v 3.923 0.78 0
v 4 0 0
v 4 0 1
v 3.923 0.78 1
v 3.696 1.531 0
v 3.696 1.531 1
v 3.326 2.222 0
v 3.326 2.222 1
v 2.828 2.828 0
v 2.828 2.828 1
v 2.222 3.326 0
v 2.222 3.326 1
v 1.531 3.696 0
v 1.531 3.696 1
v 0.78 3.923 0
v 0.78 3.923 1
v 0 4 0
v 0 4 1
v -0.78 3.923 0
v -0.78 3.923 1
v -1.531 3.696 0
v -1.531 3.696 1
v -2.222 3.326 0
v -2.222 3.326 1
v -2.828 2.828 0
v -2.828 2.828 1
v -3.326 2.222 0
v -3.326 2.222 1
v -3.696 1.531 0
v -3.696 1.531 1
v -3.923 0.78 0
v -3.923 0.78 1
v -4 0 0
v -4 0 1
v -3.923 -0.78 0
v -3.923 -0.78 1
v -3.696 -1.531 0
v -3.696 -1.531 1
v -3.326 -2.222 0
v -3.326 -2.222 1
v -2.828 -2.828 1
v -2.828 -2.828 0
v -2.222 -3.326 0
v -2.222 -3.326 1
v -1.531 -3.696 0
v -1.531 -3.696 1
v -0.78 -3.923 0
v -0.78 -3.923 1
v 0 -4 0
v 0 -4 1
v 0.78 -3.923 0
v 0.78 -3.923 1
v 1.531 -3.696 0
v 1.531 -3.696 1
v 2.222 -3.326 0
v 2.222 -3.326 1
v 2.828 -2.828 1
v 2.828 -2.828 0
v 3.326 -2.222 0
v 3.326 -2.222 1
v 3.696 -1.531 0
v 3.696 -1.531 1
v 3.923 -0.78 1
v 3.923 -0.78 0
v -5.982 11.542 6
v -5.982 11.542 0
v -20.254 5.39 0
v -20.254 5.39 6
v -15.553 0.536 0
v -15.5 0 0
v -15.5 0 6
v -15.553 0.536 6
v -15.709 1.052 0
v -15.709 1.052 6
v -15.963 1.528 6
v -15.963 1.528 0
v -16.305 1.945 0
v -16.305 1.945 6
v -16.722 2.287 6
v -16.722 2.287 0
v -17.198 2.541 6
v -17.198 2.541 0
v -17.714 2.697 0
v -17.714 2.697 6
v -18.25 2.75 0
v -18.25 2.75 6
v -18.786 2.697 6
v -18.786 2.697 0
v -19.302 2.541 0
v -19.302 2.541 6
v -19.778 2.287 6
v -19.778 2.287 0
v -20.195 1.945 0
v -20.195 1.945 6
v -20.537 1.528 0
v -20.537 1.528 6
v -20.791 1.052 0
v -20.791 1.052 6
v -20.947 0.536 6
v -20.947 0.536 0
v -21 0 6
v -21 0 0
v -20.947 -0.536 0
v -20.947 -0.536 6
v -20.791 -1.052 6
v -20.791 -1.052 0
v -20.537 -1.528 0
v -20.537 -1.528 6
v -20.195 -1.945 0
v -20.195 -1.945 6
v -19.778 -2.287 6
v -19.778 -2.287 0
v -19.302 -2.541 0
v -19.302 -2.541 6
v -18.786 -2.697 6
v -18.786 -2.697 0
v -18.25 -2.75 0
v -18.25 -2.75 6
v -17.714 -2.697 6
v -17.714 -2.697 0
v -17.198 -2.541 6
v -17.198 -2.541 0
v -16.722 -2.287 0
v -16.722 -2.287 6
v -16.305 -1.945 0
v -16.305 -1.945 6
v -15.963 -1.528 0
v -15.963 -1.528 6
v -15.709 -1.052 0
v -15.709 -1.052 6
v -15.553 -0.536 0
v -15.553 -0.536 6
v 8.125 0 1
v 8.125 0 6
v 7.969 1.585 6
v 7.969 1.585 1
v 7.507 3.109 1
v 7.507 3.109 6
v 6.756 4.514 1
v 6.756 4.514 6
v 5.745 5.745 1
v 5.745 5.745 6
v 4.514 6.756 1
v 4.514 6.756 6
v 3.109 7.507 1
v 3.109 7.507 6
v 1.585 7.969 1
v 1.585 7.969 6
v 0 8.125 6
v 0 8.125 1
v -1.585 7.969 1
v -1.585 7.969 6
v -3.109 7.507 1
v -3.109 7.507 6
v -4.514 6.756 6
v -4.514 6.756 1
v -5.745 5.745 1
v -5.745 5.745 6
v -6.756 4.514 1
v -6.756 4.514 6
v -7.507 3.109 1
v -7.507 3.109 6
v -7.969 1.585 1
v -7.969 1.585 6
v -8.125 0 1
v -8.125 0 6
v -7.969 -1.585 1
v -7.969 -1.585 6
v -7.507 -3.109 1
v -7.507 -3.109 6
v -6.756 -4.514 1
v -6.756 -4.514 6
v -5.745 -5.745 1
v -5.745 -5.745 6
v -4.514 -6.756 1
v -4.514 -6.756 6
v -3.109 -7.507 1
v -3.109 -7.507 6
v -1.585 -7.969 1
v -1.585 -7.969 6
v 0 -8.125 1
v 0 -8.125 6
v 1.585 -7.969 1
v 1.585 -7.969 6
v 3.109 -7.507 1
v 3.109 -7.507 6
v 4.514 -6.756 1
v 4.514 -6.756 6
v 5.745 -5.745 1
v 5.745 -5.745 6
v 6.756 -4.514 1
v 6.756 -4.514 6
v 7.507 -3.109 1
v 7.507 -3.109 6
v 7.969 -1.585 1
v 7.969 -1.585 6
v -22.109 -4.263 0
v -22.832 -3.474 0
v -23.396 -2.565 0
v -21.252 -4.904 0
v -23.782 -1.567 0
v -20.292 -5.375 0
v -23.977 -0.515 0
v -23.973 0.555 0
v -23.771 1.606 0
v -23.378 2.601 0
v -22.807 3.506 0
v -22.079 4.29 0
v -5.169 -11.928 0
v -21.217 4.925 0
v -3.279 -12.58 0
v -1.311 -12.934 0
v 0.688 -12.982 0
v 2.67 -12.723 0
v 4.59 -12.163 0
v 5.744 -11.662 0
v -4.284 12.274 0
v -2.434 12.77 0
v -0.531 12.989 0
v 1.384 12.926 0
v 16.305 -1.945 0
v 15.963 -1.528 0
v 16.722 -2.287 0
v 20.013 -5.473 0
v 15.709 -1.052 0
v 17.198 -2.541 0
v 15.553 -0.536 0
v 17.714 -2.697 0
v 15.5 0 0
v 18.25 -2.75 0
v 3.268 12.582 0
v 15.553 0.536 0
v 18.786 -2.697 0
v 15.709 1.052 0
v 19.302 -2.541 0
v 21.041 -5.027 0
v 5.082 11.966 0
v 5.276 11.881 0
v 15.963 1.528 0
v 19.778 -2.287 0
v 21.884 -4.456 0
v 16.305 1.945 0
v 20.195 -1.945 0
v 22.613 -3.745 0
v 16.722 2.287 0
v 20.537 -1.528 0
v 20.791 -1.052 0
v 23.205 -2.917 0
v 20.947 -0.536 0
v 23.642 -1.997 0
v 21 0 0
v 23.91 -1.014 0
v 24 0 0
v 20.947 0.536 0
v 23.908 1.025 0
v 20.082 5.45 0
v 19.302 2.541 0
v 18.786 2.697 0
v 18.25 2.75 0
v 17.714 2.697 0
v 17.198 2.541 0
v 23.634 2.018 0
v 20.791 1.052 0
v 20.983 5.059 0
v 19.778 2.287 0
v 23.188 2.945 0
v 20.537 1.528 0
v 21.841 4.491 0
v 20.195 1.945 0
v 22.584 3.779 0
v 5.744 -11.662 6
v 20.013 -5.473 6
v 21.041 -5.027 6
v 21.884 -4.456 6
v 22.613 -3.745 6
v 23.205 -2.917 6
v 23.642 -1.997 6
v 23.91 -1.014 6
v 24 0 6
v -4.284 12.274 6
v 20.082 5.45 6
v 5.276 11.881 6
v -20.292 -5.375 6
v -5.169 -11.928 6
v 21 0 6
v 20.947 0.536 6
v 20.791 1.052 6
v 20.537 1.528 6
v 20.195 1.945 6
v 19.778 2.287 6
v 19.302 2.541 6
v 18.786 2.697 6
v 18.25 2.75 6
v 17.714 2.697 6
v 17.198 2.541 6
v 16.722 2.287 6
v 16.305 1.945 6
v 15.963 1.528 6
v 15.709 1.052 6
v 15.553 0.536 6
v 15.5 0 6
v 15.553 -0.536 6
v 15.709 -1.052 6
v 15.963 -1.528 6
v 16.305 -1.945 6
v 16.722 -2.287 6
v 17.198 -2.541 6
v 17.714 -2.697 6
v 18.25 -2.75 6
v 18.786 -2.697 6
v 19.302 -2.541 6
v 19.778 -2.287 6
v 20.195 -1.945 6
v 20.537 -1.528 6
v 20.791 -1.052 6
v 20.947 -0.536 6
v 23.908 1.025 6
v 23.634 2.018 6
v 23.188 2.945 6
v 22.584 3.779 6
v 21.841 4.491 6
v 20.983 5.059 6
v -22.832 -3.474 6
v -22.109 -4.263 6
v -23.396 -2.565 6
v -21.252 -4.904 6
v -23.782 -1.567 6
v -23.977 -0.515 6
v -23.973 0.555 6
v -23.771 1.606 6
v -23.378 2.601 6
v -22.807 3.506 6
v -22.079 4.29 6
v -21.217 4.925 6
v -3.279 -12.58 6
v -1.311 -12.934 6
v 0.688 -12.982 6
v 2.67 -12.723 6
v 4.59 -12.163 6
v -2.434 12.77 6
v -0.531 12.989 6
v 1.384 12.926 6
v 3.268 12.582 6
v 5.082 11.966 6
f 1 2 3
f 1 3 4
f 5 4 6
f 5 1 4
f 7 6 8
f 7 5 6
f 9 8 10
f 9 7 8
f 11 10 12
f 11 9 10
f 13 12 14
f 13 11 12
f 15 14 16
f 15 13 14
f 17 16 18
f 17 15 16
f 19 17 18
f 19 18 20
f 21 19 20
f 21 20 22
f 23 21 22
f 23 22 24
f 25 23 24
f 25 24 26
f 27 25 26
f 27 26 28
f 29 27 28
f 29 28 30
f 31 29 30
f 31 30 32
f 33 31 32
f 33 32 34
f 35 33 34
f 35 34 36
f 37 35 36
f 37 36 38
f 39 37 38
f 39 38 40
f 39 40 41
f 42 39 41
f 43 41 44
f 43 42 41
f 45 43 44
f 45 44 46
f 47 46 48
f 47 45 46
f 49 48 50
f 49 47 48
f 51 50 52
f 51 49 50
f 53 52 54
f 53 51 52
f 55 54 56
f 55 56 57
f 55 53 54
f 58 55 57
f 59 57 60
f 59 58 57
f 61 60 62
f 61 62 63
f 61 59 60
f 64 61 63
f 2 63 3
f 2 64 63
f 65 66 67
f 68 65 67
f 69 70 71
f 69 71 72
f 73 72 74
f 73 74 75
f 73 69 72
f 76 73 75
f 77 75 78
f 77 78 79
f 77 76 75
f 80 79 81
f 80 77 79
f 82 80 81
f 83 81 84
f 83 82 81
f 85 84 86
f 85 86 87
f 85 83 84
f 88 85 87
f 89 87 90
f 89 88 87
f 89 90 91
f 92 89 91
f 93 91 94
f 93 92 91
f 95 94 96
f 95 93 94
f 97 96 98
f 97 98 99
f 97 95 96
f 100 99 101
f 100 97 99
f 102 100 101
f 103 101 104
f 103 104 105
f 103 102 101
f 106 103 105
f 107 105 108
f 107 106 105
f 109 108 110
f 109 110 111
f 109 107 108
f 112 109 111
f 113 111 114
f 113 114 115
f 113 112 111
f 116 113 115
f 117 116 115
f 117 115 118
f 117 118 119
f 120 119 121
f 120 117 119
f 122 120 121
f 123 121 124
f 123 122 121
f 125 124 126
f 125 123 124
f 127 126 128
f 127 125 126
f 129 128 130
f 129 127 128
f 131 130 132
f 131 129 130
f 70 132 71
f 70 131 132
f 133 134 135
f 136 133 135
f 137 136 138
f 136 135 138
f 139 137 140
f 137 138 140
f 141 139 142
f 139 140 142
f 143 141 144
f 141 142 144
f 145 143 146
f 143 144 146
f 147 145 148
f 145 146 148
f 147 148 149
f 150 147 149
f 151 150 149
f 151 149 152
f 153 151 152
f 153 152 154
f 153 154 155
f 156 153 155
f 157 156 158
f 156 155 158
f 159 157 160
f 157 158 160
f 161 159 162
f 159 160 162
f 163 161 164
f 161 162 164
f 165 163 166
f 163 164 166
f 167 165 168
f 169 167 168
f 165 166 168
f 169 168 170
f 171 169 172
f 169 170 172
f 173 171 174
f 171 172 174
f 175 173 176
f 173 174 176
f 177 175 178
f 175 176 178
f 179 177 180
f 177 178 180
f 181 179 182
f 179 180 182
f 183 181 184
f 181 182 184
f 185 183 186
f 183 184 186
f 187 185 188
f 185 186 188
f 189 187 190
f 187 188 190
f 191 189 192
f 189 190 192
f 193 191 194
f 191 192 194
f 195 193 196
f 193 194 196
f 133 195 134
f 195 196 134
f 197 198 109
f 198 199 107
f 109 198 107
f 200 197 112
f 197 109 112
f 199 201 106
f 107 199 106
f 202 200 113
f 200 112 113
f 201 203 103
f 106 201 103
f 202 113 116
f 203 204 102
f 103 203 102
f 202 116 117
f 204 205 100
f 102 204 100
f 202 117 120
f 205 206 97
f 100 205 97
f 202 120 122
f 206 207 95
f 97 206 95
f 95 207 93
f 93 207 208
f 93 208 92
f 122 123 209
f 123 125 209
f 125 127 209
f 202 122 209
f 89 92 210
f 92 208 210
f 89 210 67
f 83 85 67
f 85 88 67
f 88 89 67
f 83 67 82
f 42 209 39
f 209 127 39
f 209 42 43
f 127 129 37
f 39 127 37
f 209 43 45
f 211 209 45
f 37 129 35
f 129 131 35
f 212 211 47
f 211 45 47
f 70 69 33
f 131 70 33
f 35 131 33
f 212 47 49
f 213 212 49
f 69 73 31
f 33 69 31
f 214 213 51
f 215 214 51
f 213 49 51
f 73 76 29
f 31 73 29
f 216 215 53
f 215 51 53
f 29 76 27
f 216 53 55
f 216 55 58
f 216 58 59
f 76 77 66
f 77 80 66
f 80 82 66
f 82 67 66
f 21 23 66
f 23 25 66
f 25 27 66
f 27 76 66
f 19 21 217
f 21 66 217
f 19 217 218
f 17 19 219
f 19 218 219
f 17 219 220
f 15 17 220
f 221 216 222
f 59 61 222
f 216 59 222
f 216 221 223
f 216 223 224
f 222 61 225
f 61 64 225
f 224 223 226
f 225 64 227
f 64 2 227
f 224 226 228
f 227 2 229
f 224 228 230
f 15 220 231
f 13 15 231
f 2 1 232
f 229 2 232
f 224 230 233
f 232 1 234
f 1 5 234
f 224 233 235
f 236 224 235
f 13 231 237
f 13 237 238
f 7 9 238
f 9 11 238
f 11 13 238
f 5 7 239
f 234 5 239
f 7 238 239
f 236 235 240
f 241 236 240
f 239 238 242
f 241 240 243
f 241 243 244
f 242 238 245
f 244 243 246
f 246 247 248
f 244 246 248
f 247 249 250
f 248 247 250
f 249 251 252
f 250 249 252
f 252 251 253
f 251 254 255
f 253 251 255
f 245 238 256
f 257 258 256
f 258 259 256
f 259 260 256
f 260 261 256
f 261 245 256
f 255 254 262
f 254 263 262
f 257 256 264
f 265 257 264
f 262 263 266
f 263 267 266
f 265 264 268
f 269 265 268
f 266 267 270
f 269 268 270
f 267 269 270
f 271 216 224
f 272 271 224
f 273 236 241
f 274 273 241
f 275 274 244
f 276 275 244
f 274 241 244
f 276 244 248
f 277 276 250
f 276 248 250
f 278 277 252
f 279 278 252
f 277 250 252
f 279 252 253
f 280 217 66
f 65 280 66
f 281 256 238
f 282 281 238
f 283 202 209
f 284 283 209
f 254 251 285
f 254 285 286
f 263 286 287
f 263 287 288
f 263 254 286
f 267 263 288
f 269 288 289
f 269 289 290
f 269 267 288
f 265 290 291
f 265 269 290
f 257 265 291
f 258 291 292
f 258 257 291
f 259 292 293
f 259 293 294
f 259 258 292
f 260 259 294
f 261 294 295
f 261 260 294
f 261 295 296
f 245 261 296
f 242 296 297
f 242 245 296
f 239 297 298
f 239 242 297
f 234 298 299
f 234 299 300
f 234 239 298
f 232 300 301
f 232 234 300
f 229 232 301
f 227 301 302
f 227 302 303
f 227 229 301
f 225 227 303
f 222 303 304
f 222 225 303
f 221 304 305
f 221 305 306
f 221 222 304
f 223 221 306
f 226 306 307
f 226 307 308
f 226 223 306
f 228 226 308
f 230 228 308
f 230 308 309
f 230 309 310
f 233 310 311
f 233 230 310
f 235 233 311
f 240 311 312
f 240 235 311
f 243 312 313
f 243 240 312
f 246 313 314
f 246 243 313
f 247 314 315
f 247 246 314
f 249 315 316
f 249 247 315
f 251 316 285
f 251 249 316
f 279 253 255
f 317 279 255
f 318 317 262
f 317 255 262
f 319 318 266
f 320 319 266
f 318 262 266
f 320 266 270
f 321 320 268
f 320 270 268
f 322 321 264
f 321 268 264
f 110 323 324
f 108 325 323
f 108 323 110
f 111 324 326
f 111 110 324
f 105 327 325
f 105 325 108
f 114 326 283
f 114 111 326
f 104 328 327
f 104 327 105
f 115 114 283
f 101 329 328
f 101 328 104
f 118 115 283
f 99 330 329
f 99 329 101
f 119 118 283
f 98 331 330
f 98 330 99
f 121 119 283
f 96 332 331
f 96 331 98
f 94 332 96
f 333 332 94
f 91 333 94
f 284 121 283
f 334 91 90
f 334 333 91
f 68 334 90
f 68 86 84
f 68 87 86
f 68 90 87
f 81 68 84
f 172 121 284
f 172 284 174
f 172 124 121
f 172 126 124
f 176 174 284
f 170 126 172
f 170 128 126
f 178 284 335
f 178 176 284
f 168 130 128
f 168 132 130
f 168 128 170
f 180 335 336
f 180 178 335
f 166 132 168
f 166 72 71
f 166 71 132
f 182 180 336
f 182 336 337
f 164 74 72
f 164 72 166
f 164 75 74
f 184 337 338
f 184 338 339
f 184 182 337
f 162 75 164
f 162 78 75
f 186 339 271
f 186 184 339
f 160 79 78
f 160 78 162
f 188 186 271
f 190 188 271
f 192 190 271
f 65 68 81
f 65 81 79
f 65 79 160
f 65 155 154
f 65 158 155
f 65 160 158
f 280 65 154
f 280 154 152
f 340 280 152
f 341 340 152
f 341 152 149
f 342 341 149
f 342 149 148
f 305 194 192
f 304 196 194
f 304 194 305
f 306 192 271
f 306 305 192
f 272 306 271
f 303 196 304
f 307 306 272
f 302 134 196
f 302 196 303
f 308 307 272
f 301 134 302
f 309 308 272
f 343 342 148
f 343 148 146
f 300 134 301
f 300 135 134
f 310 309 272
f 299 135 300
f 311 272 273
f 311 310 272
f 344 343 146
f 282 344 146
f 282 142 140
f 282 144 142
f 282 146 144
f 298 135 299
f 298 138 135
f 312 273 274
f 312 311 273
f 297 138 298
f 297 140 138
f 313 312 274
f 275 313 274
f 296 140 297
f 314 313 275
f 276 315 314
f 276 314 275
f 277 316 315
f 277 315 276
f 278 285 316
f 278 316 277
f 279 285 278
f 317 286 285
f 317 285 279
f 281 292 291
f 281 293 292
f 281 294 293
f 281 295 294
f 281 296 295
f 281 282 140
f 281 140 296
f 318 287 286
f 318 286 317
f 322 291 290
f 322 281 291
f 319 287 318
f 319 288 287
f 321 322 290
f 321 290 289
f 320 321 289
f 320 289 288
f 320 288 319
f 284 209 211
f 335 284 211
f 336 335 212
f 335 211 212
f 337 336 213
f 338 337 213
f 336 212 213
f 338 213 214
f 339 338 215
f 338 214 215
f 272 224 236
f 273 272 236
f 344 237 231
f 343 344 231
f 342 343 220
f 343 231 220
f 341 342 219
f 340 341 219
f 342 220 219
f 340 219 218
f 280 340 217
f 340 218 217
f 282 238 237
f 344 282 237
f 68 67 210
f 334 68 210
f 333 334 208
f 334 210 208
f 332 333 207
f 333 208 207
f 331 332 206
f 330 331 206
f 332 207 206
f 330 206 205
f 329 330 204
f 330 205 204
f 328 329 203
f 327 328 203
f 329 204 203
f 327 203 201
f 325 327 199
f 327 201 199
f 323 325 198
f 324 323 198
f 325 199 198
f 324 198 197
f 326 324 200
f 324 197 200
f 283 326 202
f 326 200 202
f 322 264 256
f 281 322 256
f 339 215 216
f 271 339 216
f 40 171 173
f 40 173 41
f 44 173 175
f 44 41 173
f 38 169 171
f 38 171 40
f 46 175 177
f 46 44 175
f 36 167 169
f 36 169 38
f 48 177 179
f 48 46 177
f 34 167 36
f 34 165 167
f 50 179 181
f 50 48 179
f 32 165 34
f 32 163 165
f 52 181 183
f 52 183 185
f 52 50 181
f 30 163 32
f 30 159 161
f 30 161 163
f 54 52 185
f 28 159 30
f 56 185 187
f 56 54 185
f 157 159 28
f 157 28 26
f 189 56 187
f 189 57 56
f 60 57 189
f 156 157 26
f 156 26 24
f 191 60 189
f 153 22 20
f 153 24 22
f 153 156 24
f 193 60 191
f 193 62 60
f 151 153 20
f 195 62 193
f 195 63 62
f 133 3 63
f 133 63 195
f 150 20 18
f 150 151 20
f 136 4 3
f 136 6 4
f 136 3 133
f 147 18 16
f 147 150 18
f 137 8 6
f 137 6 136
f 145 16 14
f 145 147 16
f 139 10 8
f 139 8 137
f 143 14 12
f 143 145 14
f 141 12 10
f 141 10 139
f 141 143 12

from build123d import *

# Parameters (mm, degrees)
F0_R     = 2.75
F0_R_2   = 4
F1_DEPTH = 6
F2_R     = 8.125
F2_R_2   = 4
F3_DEPTH = 5


# Not quite as in the source:
# - a feature names something its author has since deleted; it is built from what else it names


with BuildPart() as f1:
    # F0 (on Top) → F1 (new body)
    with BuildSketch(Plane.XY):
        with BuildLine():
            ThreePointArc((20.0822139412, 5.4502744952), (15.7589539647, 5.182392271), (12.8493150685, 1.9736013454))
            ThreePointArc((12.8493150685, 1.9736013454), (12.9622740268, 0.9896727008), (13, 0))
            ThreePointArc((13, 0), (12.9622740268, -0.9896727008), (12.8493150685, -1.9736013454))
            ThreePointArc((12.8493150685, -1.9736013454), (15.7262122641, -5.1665264409), (20.0130954241, -5.4730242577))
            Line((20.0130954241, -5.4730242577), (21.0412591059, -5.0270640143))
            ThreePointArc((21.0412591059, -5.0270640143), (23.2054131946, -2.9165699153), (24, 0))
            ThreePointArc((24, 0), (23.1883419046, 2.9453826972), (20.982511571, 5.0592371474))
            Line((20.982511571, 5.0592371474), (20.0822139412, 5.4502744952))
        make_face()
        with Locations((18.25, 0)):
            Circle(F0_R, mode=Mode.SUBTRACT)
        with BuildLine():
            Line((20.0822139412, 5.4502744952), (5.2758693561, 11.8812963323))
            ThreePointArc((5.2758693561, 11.8812963323), (10.328174214, 7.8948601891), (12.8493150685, 1.9736013454))
            ThreePointArc((12.8493150685, 1.9736013454), (15.7589539647, 5.182392271), (20.0822139412, 5.4502744952))
        make_face()
        with BuildLine():
            ThreePointArc((13, 0), (12.9622740268, 0.9896727008), (12.8493150685, 1.9736013454))
            ThreePointArc((12.8493150685, 1.9736013454), (12.5, 0), (12.8493150685, -1.9736013454))
            ThreePointArc((12.8493150685, -1.9736013454), (12.9622740268, -0.9896727008), (13, 0))
        make_face()
        with BuildLine():
            ThreePointArc((20.0130954241, -5.4730242577), (15.7262122641, -5.1665264409), (12.8493150685, -1.9736013454))
            ThreePointArc((12.8493150685, -1.9736013454), (10.4831727002, -7.6878534154), (5.7442785493, -11.6620437295))
            Line((5.7442785493, -11.6620437295), (20.0130954241, -5.4730242577))
        make_face()
        with BuildLine():
            Line((5.2758693561, 11.8812963323), (5.0818351063, 11.9655736157))
            ThreePointArc((5.0818351063, 11.9655736157), (0.4274688612, 12.9929700366), (-4.2843620194, 12.273721607))
            Line((-4.2843620194, 12.273721607), (-5.9821590265, 11.5418271249))
            ThreePointArc((-5.9821590265, 11.5418271249), (-10.5614317348, 7.5799841498), (-12.8493150685, 1.9736013454))
            ThreePointArc((-12.8493150685, 1.9736013454), (-12.588002192, 1.0021381252), (-12.5, 0))
            ThreePointArc((-12.5, 0), (-12.588002192, -1.0021381252), (-12.8493150685, -1.9736013454))
            ThreePointArc((-12.8493150685, -1.9736013454), (-10.2925346971, -7.9412675001), (-5.1687008476, -11.9283079918))
            ThreePointArc((-5.1687008476, -11.9283079918), (-0.3123803464, -12.9962463242), (4.589640736, -12.1628614197))
            Line((4.589640736, -12.1628614197), (5.7442785493, -11.6620437295))
            ThreePointArc((5.7442785493, -11.6620437295), (10.4831727002, -7.6878534154), (12.8493150685, -1.9736013454))
            ThreePointArc((12.8493150685, -1.9736013454), (12.5, 0), (12.8493150685, 1.9736013454))
            ThreePointArc((12.8493150685, 1.9736013454), (10.328174214, 7.8948601891), (5.2758693561, 11.8812963323))
        make_face()
        Circle(F0_R_2, mode=Mode.SUBTRACT)
        with BuildLine():
            ThreePointArc((-12.8493150685, -1.9736013454), (-13, 0), (-12.8493150685, 1.9736013454))
            ThreePointArc((-12.8493150685, 1.9736013454), (-15.8411768162, 5.2211177797), (-20.2535684755, 5.3896394466))
            ThreePointArc((-20.2535684755, 5.3896394466), (-23.9999641766, 0.020296977), (-20.2915681825, -5.3753603932))
            ThreePointArc((-20.2915681825, -5.3753603932), (-15.8596218943, -5.229588178), (-12.8493150685, -1.9736013454))
        make_face()
        with Locations((-18.25, 0)):
            Circle(F0_R, mode=Mode.SUBTRACT)
        with BuildLine():
            ThreePointArc((-12.5, 0), (-12.588002192, 1.0021381252), (-12.8493150685, 1.9736013454))
            ThreePointArc((-12.8493150685, 1.9736013454), (-13, 0), (-12.8493150685, -1.9736013454))
            ThreePointArc((-12.8493150685, -1.9736013454), (-12.588002192, -1.0021381252), (-12.5, 0))
        make_face()
        with BuildLine():
            ThreePointArc((-12.8493150685, 1.9736013454), (-10.5614317348, 7.5799841498), (-5.9821590265, 11.5418271249))
            Line((-5.9821590265, 11.5418271249), (-20.2535684755, 5.3896394466))
            ThreePointArc((-20.2535684755, 5.3896394466), (-15.8411768162, 5.2211177797), (-12.8493150685, 1.9736013454))
        make_face()
        with BuildLine():
            ThreePointArc((-5.1687008476, -11.9283079918), (-10.2925346971, -7.9412675001), (-12.8493150685, -1.9736013454))
            ThreePointArc((-12.8493150685, -1.9736013454), (-15.8596218943, -5.229588178), (-20.2915681825, -5.3753603932))
            Line((-20.2915681825, -5.3753603932), (-5.1687008476, -11.9283079918))
        make_face()
    extrude(amount=F1_DEPTH)

    # F2 (on face) → F3 (cut)
    with BuildSketch(Plane.XY.offset(6)):
        Circle(F2_R)
        Circle(F2_R_2, mode=Mode.SUBTRACT)
    extrude(amount=-F3_DEPTH, mode=Mode.SUBTRACT)


solid = f1.part
